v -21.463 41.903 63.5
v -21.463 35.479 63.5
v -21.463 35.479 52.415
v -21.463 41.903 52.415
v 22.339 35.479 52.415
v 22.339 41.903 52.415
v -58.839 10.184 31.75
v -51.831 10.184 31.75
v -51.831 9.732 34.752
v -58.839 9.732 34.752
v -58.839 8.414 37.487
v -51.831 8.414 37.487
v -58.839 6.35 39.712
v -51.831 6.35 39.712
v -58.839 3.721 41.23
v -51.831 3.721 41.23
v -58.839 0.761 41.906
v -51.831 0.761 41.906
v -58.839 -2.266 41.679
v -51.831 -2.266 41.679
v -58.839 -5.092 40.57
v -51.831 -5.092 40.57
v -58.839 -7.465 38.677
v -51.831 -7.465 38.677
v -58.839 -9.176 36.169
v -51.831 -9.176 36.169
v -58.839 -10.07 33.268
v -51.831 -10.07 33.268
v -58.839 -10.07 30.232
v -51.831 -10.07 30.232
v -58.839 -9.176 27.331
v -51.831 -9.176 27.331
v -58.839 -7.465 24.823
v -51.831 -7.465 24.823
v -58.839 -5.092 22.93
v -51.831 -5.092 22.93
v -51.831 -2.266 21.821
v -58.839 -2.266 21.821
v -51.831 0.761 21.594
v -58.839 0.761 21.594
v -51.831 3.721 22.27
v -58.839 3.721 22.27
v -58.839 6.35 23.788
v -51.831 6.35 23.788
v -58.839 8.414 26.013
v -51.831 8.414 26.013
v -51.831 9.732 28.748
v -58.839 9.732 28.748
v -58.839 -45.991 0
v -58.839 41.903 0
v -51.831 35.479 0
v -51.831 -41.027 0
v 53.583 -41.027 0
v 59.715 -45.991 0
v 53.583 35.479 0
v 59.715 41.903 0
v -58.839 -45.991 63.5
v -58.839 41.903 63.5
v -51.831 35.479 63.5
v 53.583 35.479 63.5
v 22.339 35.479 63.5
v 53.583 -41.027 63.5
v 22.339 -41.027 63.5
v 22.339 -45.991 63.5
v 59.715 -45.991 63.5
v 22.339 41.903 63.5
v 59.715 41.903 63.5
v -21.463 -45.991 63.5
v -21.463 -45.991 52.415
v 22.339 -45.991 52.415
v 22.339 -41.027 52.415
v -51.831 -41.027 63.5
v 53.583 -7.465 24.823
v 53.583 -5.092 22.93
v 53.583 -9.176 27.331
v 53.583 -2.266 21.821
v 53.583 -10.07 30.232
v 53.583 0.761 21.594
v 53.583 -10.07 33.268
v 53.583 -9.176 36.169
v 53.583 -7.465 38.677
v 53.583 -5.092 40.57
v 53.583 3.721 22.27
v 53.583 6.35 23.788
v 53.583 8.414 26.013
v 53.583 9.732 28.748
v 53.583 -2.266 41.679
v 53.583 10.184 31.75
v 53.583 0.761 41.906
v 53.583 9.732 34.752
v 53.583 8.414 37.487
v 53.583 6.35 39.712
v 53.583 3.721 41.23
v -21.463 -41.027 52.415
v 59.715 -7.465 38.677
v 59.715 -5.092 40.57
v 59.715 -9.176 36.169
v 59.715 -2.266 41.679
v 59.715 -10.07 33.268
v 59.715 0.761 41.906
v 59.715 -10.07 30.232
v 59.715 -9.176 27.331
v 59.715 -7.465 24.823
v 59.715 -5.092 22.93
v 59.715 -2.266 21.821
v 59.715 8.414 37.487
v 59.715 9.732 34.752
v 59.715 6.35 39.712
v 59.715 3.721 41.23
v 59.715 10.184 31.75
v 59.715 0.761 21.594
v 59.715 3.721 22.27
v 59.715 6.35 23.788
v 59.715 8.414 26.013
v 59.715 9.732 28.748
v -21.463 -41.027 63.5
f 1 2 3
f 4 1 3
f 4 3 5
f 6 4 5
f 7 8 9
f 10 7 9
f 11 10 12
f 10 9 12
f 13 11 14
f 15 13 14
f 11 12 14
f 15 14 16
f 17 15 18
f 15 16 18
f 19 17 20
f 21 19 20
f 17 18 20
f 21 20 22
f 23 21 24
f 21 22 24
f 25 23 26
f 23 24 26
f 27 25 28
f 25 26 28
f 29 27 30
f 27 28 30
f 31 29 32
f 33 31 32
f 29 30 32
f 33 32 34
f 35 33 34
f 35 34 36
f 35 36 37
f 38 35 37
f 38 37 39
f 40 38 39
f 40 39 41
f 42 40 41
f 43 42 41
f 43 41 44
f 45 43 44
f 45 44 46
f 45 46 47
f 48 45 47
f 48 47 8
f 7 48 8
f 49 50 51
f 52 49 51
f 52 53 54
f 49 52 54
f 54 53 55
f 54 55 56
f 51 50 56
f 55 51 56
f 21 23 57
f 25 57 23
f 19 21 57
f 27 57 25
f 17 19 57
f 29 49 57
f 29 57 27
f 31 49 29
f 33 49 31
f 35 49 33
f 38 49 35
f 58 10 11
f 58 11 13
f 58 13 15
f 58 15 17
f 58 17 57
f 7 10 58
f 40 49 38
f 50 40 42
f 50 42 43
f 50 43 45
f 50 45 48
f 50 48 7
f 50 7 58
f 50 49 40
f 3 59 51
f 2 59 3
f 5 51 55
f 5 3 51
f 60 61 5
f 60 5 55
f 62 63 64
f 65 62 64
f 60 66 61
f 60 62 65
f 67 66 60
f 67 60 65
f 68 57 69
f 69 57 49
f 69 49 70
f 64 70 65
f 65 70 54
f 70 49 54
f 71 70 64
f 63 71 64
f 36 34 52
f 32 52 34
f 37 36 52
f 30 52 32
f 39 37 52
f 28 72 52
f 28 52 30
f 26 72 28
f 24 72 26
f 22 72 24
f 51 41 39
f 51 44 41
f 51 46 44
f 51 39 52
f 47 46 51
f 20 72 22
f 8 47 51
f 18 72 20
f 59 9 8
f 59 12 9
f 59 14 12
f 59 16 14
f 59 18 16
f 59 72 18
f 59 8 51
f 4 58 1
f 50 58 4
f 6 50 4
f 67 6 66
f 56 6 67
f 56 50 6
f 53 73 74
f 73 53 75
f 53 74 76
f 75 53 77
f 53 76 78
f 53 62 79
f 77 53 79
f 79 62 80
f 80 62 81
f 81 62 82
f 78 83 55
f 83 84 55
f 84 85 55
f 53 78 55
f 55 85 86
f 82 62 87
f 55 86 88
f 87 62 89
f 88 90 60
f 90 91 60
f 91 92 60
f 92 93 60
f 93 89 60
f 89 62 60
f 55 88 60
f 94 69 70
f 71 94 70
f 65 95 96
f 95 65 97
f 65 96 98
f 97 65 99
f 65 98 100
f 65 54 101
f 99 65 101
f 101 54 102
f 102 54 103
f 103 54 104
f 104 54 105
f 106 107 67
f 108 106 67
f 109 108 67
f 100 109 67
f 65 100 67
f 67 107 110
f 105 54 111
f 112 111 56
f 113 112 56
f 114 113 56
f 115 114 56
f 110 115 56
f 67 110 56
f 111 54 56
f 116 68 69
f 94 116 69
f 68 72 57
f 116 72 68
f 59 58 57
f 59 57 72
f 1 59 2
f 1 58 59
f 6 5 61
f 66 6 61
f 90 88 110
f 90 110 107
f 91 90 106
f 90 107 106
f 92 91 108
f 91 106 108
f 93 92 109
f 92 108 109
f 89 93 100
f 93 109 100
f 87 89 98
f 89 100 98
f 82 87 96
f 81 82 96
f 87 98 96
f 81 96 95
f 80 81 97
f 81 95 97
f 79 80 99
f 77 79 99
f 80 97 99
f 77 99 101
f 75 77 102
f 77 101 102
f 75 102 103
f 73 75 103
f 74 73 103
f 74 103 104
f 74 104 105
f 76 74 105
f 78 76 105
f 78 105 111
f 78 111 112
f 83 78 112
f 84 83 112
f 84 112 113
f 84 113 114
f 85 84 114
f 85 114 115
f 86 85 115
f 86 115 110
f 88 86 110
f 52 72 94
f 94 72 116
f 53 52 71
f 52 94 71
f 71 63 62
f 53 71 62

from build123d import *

# Parameters (mm, degrees)
F0_W     = 118.554965
F0_H     = 87.894202
F1_DEPTH = 63.5
F2_W     = 105.414637
F2_H     = 76.505914
F3_DEPTH = 63.5
F5_DEPTH = 127
F6_R     = 10.184042
F7_DEPTH = 254


with BuildPart() as f1:
    # F0 (on Top) → F1 (new body)
    with BuildSketch(Plane.XY):
        with Locations((0.438012, -2.044052)):
            Rectangle(F0_W, F0_H)
    extrude(amount=F1_DEPTH)

    # F2 (on face) → F3 (cut)
    with BuildSketch(Plane.XY.offset(63.5)):
        with Locations((0.87602, -2.774071)):
            Rectangle(F2_W, F2_H)
    extrude(amount=-F3_DEPTH, mode=Mode.SUBTRACT)

    # F4 (on face) → F5 (cut)
    with BuildSketch(Plane.XZ.offset(45.991153)):
        Polygon((22.338558, 63.5), (-21.462537, 63.5), (-21.462537, 52.415308), (0.438012, 52.415308), (22.338558, 52.415308), align=None)
    extrude(amount=-F5_DEPTH, mode=Mode.SUBTRACT)

    # F6 (on face) → F7 (cut)
    with BuildSketch(Plane.YZ.offset(59.715495)):
        with Locations((0, 31.75)):
            Circle(F6_R)
    extrude(amount=-F7_DEPTH, mode=Mode.SUBTRACT)


solid = f1.part
